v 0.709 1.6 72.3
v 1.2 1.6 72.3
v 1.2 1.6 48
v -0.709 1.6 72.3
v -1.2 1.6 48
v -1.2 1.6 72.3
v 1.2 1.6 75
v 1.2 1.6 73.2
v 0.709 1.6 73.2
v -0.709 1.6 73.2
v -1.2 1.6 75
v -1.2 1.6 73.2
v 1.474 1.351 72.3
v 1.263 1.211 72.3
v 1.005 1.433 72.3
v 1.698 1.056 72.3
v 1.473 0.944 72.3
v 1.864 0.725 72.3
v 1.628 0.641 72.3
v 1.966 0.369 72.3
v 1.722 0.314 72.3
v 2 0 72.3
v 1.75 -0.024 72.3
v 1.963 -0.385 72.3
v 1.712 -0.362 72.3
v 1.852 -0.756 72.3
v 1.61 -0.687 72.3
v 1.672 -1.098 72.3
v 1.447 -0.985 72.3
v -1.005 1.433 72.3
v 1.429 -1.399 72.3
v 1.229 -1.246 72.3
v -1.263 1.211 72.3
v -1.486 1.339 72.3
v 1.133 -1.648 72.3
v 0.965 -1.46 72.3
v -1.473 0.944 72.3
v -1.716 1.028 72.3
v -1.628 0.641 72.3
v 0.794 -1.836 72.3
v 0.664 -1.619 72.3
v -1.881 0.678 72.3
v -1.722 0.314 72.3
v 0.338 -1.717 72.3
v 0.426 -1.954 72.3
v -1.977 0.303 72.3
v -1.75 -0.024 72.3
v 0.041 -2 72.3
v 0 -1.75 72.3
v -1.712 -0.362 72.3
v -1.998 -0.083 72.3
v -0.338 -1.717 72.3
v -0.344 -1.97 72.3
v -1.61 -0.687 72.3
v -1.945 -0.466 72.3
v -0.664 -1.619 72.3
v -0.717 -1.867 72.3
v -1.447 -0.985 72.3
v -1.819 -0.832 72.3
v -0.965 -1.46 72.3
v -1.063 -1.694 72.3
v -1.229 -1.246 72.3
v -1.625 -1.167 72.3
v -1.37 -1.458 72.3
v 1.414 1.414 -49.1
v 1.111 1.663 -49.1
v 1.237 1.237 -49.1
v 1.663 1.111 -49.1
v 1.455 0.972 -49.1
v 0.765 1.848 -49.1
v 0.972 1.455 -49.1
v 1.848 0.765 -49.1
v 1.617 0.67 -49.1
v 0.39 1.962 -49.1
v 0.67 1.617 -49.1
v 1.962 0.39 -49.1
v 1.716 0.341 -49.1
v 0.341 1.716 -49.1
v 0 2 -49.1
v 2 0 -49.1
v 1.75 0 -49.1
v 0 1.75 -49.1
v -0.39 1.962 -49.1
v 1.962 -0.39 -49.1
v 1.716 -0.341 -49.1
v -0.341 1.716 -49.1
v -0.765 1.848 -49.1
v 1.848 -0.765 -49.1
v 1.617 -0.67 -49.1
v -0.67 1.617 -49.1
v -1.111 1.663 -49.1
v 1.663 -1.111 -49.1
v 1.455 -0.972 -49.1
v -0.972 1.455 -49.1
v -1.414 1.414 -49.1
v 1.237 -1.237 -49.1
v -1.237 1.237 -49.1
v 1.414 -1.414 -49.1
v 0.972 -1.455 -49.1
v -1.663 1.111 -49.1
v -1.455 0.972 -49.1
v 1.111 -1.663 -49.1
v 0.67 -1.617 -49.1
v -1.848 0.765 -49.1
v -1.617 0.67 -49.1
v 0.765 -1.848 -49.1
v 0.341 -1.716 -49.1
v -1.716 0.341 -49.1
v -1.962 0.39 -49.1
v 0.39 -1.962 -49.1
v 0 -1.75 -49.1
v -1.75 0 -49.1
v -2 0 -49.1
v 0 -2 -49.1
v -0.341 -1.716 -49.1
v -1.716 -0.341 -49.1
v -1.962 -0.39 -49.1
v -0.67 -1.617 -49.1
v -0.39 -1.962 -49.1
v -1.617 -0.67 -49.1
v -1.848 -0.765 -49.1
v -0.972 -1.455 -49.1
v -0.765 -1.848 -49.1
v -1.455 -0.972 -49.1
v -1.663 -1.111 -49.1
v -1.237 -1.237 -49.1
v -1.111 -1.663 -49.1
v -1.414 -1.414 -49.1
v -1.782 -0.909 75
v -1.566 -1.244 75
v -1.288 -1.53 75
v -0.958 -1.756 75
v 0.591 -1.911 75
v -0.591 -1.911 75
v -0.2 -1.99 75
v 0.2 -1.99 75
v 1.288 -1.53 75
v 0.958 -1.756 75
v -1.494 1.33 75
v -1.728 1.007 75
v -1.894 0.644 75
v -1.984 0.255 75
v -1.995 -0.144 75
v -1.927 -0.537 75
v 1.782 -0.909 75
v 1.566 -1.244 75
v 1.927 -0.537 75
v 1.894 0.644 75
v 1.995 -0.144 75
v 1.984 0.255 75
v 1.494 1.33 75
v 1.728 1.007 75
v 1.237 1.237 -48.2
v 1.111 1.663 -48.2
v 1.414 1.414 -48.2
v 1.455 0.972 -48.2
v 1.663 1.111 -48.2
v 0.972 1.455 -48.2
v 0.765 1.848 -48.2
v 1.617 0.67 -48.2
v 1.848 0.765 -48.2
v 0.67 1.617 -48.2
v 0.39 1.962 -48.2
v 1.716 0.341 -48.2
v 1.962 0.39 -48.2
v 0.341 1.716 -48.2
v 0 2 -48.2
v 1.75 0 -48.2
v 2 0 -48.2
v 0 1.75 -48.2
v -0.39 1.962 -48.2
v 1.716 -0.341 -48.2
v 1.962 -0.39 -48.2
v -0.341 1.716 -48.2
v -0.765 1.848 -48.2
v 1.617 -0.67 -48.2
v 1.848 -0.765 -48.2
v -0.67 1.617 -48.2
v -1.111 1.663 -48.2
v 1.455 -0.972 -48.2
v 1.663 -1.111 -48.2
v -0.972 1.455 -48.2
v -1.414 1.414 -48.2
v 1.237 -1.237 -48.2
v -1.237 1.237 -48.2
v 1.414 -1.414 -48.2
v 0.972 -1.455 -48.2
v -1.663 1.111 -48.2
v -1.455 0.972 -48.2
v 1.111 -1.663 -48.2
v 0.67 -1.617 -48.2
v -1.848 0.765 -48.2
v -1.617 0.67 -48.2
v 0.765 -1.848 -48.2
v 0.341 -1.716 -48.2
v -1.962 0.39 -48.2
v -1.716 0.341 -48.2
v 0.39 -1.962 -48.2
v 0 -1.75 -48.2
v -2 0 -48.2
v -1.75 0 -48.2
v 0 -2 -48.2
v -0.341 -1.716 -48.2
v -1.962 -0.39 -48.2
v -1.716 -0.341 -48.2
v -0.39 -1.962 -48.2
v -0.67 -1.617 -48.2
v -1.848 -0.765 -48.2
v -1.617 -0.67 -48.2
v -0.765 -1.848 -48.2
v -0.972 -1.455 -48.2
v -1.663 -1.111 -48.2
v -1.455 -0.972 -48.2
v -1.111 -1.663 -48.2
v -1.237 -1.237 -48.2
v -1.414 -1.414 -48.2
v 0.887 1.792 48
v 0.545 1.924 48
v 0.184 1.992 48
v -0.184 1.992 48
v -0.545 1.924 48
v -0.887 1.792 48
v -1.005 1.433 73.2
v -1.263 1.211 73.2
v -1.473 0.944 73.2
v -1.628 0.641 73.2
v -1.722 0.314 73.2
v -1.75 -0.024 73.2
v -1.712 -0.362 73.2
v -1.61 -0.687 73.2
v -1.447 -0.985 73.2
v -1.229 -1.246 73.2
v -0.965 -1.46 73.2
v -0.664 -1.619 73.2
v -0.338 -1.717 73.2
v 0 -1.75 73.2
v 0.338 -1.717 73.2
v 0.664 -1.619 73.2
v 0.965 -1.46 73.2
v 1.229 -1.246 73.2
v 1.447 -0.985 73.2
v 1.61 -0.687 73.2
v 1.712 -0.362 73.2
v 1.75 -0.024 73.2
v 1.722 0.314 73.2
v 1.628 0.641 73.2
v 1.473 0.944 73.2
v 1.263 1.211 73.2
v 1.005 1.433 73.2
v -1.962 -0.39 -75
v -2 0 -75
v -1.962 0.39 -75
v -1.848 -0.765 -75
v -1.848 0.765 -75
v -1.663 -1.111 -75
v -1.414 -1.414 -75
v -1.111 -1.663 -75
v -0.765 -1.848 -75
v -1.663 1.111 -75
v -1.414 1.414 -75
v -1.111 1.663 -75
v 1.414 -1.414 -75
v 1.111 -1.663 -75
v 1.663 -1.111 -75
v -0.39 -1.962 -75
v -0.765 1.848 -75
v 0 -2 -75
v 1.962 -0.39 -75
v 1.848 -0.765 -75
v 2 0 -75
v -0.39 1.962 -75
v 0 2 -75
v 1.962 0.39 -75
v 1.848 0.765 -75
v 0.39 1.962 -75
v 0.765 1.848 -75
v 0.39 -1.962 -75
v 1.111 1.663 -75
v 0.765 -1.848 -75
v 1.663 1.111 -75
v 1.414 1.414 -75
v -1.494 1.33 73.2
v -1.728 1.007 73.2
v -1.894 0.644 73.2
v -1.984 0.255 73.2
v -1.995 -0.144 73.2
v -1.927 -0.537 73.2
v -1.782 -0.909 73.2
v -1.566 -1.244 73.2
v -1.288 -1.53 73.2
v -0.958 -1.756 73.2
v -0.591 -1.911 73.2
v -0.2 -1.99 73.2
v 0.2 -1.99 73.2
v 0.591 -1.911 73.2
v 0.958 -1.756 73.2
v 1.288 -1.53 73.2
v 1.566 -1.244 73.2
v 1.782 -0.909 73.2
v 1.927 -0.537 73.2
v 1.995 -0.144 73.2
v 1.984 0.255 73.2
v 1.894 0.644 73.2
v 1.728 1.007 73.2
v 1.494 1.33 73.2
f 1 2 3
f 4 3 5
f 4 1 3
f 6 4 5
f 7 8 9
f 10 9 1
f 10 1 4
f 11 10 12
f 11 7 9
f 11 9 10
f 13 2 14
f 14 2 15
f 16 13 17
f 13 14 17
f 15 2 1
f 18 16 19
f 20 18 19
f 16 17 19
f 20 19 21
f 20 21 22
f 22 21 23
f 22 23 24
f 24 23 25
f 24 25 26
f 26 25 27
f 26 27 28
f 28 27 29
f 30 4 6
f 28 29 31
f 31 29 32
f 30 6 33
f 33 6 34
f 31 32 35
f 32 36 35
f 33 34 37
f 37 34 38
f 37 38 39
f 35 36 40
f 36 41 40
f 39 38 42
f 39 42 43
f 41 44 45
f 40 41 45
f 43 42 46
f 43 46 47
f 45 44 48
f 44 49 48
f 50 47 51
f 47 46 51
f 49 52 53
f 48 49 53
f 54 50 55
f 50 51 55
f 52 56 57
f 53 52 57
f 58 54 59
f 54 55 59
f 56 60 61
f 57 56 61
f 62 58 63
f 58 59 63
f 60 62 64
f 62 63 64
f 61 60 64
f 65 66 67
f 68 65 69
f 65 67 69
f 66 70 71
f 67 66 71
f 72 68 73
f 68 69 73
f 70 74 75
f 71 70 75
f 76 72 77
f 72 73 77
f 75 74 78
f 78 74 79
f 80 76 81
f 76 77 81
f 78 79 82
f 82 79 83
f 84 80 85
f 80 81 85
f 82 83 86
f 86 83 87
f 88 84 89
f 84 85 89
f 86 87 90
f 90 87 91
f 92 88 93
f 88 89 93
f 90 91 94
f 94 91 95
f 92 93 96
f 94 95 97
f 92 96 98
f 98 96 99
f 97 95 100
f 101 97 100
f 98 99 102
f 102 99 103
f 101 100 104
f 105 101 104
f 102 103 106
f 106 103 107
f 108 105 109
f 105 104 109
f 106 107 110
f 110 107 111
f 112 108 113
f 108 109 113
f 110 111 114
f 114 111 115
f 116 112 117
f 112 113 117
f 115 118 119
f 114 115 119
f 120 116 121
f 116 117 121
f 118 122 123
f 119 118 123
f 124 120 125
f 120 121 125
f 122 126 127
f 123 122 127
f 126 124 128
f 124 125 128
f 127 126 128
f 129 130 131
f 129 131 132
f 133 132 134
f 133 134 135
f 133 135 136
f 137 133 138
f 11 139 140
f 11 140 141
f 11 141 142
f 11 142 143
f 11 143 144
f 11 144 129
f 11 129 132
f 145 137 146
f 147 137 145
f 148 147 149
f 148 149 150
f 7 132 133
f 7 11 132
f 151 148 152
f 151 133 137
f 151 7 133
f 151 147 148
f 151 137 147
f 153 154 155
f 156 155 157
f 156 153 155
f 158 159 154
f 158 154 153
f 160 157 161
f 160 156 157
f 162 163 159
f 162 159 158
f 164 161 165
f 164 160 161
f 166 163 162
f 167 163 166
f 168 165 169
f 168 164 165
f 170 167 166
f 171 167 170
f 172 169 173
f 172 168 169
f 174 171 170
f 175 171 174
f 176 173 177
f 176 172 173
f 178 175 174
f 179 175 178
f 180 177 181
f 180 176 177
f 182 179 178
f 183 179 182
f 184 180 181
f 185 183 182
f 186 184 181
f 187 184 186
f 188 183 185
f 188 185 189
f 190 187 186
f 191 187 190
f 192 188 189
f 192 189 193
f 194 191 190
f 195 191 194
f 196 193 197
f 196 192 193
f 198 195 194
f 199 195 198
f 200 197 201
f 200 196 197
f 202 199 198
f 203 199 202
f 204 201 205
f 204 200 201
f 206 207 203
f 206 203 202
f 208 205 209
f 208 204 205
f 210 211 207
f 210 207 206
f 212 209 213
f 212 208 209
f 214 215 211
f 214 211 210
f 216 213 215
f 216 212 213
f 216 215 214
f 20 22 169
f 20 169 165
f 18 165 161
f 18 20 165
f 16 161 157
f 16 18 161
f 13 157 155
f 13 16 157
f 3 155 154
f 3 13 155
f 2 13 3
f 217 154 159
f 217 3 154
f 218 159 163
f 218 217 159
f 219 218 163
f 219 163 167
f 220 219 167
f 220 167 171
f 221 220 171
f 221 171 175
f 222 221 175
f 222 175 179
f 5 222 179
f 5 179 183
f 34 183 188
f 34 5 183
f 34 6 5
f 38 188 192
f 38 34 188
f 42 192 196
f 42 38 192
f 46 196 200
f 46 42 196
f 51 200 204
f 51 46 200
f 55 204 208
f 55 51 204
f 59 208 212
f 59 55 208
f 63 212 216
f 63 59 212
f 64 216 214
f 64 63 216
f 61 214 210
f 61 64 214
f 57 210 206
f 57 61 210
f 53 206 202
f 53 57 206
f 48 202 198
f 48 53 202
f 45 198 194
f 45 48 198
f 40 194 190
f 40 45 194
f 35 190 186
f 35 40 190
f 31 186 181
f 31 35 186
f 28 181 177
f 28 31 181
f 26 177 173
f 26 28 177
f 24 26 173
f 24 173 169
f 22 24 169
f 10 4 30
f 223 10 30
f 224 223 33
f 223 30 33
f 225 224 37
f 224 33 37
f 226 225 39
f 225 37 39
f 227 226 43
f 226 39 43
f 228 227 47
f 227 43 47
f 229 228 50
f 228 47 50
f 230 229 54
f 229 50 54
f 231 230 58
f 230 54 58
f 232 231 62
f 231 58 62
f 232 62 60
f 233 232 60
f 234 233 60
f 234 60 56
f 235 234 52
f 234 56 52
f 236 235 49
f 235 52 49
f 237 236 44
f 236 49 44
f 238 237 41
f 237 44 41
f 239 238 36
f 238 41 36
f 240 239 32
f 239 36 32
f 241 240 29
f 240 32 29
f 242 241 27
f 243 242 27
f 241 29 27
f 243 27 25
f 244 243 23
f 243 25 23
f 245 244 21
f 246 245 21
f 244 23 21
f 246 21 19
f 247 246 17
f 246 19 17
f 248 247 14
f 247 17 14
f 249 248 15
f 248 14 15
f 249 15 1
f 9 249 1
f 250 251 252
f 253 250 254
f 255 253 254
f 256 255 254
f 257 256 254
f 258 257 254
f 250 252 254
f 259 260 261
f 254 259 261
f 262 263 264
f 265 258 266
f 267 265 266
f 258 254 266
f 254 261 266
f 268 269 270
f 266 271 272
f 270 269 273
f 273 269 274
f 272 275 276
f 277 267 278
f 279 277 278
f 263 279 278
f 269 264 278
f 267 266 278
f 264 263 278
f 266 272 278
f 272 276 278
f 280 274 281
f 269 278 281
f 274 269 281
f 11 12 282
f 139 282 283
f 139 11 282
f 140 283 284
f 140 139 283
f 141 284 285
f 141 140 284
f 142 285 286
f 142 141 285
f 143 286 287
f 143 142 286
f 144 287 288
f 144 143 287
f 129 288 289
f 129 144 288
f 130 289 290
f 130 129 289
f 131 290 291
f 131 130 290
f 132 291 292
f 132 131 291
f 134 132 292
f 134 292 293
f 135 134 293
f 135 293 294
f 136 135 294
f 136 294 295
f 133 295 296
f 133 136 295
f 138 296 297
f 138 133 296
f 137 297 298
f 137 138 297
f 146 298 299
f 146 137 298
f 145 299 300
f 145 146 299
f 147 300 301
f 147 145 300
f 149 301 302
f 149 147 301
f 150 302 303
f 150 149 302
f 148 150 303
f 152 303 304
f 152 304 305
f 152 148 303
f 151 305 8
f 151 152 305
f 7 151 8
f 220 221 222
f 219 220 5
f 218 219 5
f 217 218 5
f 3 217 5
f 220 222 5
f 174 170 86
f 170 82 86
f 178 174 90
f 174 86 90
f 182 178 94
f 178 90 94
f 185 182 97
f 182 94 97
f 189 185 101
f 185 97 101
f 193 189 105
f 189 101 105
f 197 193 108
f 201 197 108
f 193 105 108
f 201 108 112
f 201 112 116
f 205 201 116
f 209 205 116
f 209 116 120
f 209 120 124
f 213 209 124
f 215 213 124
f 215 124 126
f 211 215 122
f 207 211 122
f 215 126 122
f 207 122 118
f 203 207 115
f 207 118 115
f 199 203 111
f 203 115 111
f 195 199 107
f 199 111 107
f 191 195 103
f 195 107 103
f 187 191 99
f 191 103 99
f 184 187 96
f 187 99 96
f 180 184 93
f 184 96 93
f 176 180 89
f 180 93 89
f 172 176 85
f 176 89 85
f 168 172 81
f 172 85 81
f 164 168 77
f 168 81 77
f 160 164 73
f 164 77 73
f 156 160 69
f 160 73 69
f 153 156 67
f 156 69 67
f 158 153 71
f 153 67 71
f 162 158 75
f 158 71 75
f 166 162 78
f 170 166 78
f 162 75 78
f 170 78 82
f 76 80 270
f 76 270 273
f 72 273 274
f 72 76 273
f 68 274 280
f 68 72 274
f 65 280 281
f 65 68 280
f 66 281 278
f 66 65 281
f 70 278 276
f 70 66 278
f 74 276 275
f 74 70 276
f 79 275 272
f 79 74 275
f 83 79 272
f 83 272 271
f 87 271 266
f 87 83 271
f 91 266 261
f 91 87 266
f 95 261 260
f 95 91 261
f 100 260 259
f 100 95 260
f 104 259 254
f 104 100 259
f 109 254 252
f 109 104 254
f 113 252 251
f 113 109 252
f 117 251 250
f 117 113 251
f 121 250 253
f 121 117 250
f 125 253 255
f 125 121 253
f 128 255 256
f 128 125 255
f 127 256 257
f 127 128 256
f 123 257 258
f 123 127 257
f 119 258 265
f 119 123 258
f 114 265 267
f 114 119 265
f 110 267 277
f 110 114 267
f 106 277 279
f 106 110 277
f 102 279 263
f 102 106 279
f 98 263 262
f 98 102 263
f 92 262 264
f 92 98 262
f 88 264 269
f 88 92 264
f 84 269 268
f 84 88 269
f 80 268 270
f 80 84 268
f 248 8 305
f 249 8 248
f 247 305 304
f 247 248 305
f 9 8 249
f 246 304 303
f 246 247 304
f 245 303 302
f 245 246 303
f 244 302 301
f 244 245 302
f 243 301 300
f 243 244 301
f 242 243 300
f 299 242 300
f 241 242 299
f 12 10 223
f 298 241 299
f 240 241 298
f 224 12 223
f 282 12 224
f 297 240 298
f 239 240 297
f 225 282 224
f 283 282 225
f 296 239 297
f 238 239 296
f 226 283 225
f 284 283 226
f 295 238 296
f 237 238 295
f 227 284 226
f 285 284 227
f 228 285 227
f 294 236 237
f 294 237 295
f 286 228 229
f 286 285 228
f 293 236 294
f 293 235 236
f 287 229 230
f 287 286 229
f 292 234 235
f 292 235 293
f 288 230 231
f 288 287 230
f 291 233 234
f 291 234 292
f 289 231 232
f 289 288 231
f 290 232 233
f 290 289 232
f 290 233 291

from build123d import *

# Parameters (mm, degrees)
SKIZZE1_R                       = 2
AUFSATZ_LINEAR_AUSTRAGEN1_DEPTH = 75
SKIZZE7_W                       = 0.9
SKIZZE7_H                       = 0.25
SCHNITT_LINEAR_AUSTRAGEN1_DEPTH = 27


with BuildPart() as part:
    # Skizze1 → Aufsatz-Linear austragen1 (new, symmetric)
    with BuildSketch(Plane.XY):
        Circle(SKIZZE1_R)
    extrude(amount=AUFSATZ_LINEAR_AUSTRAGEN1_DEPTH, both=True)

    # Skizze7 → Schnitt-Rotation1 (revolve, cut)
    with BuildSketch(Plane(origin=(0, 0, 0), x_dir=(0, 0, -1), z_dir=(1, 0, 0))):
        with Locations((-72.75, 1.875)):
            Rectangle(SKIZZE7_W, SKIZZE7_H)
        with Locations((48.65, 1.875)):
            Rectangle(SKIZZE7_W, SKIZZE7_H)
    revolve(axis=Axis((0, 0, -75), (0, 0, 1)), mode=Mode.SUBTRACT)

    # Skizze8 → Schnitt-Linear austragen1 (cut)
    with BuildSketch(Plane.XY.offset(75)):
        with BuildLine():
            Line((1.2, 1.6), (-1.2, 1.6))
            ThreePointArc((-1.2, 1.6), (0, 2), (1.2, 1.6))
        make_face()
    extrude(amount=-SCHNITT_LINEAR_AUSTRAGEN1_DEPTH, mode=Mode.SUBTRACT)


solid = part.part
